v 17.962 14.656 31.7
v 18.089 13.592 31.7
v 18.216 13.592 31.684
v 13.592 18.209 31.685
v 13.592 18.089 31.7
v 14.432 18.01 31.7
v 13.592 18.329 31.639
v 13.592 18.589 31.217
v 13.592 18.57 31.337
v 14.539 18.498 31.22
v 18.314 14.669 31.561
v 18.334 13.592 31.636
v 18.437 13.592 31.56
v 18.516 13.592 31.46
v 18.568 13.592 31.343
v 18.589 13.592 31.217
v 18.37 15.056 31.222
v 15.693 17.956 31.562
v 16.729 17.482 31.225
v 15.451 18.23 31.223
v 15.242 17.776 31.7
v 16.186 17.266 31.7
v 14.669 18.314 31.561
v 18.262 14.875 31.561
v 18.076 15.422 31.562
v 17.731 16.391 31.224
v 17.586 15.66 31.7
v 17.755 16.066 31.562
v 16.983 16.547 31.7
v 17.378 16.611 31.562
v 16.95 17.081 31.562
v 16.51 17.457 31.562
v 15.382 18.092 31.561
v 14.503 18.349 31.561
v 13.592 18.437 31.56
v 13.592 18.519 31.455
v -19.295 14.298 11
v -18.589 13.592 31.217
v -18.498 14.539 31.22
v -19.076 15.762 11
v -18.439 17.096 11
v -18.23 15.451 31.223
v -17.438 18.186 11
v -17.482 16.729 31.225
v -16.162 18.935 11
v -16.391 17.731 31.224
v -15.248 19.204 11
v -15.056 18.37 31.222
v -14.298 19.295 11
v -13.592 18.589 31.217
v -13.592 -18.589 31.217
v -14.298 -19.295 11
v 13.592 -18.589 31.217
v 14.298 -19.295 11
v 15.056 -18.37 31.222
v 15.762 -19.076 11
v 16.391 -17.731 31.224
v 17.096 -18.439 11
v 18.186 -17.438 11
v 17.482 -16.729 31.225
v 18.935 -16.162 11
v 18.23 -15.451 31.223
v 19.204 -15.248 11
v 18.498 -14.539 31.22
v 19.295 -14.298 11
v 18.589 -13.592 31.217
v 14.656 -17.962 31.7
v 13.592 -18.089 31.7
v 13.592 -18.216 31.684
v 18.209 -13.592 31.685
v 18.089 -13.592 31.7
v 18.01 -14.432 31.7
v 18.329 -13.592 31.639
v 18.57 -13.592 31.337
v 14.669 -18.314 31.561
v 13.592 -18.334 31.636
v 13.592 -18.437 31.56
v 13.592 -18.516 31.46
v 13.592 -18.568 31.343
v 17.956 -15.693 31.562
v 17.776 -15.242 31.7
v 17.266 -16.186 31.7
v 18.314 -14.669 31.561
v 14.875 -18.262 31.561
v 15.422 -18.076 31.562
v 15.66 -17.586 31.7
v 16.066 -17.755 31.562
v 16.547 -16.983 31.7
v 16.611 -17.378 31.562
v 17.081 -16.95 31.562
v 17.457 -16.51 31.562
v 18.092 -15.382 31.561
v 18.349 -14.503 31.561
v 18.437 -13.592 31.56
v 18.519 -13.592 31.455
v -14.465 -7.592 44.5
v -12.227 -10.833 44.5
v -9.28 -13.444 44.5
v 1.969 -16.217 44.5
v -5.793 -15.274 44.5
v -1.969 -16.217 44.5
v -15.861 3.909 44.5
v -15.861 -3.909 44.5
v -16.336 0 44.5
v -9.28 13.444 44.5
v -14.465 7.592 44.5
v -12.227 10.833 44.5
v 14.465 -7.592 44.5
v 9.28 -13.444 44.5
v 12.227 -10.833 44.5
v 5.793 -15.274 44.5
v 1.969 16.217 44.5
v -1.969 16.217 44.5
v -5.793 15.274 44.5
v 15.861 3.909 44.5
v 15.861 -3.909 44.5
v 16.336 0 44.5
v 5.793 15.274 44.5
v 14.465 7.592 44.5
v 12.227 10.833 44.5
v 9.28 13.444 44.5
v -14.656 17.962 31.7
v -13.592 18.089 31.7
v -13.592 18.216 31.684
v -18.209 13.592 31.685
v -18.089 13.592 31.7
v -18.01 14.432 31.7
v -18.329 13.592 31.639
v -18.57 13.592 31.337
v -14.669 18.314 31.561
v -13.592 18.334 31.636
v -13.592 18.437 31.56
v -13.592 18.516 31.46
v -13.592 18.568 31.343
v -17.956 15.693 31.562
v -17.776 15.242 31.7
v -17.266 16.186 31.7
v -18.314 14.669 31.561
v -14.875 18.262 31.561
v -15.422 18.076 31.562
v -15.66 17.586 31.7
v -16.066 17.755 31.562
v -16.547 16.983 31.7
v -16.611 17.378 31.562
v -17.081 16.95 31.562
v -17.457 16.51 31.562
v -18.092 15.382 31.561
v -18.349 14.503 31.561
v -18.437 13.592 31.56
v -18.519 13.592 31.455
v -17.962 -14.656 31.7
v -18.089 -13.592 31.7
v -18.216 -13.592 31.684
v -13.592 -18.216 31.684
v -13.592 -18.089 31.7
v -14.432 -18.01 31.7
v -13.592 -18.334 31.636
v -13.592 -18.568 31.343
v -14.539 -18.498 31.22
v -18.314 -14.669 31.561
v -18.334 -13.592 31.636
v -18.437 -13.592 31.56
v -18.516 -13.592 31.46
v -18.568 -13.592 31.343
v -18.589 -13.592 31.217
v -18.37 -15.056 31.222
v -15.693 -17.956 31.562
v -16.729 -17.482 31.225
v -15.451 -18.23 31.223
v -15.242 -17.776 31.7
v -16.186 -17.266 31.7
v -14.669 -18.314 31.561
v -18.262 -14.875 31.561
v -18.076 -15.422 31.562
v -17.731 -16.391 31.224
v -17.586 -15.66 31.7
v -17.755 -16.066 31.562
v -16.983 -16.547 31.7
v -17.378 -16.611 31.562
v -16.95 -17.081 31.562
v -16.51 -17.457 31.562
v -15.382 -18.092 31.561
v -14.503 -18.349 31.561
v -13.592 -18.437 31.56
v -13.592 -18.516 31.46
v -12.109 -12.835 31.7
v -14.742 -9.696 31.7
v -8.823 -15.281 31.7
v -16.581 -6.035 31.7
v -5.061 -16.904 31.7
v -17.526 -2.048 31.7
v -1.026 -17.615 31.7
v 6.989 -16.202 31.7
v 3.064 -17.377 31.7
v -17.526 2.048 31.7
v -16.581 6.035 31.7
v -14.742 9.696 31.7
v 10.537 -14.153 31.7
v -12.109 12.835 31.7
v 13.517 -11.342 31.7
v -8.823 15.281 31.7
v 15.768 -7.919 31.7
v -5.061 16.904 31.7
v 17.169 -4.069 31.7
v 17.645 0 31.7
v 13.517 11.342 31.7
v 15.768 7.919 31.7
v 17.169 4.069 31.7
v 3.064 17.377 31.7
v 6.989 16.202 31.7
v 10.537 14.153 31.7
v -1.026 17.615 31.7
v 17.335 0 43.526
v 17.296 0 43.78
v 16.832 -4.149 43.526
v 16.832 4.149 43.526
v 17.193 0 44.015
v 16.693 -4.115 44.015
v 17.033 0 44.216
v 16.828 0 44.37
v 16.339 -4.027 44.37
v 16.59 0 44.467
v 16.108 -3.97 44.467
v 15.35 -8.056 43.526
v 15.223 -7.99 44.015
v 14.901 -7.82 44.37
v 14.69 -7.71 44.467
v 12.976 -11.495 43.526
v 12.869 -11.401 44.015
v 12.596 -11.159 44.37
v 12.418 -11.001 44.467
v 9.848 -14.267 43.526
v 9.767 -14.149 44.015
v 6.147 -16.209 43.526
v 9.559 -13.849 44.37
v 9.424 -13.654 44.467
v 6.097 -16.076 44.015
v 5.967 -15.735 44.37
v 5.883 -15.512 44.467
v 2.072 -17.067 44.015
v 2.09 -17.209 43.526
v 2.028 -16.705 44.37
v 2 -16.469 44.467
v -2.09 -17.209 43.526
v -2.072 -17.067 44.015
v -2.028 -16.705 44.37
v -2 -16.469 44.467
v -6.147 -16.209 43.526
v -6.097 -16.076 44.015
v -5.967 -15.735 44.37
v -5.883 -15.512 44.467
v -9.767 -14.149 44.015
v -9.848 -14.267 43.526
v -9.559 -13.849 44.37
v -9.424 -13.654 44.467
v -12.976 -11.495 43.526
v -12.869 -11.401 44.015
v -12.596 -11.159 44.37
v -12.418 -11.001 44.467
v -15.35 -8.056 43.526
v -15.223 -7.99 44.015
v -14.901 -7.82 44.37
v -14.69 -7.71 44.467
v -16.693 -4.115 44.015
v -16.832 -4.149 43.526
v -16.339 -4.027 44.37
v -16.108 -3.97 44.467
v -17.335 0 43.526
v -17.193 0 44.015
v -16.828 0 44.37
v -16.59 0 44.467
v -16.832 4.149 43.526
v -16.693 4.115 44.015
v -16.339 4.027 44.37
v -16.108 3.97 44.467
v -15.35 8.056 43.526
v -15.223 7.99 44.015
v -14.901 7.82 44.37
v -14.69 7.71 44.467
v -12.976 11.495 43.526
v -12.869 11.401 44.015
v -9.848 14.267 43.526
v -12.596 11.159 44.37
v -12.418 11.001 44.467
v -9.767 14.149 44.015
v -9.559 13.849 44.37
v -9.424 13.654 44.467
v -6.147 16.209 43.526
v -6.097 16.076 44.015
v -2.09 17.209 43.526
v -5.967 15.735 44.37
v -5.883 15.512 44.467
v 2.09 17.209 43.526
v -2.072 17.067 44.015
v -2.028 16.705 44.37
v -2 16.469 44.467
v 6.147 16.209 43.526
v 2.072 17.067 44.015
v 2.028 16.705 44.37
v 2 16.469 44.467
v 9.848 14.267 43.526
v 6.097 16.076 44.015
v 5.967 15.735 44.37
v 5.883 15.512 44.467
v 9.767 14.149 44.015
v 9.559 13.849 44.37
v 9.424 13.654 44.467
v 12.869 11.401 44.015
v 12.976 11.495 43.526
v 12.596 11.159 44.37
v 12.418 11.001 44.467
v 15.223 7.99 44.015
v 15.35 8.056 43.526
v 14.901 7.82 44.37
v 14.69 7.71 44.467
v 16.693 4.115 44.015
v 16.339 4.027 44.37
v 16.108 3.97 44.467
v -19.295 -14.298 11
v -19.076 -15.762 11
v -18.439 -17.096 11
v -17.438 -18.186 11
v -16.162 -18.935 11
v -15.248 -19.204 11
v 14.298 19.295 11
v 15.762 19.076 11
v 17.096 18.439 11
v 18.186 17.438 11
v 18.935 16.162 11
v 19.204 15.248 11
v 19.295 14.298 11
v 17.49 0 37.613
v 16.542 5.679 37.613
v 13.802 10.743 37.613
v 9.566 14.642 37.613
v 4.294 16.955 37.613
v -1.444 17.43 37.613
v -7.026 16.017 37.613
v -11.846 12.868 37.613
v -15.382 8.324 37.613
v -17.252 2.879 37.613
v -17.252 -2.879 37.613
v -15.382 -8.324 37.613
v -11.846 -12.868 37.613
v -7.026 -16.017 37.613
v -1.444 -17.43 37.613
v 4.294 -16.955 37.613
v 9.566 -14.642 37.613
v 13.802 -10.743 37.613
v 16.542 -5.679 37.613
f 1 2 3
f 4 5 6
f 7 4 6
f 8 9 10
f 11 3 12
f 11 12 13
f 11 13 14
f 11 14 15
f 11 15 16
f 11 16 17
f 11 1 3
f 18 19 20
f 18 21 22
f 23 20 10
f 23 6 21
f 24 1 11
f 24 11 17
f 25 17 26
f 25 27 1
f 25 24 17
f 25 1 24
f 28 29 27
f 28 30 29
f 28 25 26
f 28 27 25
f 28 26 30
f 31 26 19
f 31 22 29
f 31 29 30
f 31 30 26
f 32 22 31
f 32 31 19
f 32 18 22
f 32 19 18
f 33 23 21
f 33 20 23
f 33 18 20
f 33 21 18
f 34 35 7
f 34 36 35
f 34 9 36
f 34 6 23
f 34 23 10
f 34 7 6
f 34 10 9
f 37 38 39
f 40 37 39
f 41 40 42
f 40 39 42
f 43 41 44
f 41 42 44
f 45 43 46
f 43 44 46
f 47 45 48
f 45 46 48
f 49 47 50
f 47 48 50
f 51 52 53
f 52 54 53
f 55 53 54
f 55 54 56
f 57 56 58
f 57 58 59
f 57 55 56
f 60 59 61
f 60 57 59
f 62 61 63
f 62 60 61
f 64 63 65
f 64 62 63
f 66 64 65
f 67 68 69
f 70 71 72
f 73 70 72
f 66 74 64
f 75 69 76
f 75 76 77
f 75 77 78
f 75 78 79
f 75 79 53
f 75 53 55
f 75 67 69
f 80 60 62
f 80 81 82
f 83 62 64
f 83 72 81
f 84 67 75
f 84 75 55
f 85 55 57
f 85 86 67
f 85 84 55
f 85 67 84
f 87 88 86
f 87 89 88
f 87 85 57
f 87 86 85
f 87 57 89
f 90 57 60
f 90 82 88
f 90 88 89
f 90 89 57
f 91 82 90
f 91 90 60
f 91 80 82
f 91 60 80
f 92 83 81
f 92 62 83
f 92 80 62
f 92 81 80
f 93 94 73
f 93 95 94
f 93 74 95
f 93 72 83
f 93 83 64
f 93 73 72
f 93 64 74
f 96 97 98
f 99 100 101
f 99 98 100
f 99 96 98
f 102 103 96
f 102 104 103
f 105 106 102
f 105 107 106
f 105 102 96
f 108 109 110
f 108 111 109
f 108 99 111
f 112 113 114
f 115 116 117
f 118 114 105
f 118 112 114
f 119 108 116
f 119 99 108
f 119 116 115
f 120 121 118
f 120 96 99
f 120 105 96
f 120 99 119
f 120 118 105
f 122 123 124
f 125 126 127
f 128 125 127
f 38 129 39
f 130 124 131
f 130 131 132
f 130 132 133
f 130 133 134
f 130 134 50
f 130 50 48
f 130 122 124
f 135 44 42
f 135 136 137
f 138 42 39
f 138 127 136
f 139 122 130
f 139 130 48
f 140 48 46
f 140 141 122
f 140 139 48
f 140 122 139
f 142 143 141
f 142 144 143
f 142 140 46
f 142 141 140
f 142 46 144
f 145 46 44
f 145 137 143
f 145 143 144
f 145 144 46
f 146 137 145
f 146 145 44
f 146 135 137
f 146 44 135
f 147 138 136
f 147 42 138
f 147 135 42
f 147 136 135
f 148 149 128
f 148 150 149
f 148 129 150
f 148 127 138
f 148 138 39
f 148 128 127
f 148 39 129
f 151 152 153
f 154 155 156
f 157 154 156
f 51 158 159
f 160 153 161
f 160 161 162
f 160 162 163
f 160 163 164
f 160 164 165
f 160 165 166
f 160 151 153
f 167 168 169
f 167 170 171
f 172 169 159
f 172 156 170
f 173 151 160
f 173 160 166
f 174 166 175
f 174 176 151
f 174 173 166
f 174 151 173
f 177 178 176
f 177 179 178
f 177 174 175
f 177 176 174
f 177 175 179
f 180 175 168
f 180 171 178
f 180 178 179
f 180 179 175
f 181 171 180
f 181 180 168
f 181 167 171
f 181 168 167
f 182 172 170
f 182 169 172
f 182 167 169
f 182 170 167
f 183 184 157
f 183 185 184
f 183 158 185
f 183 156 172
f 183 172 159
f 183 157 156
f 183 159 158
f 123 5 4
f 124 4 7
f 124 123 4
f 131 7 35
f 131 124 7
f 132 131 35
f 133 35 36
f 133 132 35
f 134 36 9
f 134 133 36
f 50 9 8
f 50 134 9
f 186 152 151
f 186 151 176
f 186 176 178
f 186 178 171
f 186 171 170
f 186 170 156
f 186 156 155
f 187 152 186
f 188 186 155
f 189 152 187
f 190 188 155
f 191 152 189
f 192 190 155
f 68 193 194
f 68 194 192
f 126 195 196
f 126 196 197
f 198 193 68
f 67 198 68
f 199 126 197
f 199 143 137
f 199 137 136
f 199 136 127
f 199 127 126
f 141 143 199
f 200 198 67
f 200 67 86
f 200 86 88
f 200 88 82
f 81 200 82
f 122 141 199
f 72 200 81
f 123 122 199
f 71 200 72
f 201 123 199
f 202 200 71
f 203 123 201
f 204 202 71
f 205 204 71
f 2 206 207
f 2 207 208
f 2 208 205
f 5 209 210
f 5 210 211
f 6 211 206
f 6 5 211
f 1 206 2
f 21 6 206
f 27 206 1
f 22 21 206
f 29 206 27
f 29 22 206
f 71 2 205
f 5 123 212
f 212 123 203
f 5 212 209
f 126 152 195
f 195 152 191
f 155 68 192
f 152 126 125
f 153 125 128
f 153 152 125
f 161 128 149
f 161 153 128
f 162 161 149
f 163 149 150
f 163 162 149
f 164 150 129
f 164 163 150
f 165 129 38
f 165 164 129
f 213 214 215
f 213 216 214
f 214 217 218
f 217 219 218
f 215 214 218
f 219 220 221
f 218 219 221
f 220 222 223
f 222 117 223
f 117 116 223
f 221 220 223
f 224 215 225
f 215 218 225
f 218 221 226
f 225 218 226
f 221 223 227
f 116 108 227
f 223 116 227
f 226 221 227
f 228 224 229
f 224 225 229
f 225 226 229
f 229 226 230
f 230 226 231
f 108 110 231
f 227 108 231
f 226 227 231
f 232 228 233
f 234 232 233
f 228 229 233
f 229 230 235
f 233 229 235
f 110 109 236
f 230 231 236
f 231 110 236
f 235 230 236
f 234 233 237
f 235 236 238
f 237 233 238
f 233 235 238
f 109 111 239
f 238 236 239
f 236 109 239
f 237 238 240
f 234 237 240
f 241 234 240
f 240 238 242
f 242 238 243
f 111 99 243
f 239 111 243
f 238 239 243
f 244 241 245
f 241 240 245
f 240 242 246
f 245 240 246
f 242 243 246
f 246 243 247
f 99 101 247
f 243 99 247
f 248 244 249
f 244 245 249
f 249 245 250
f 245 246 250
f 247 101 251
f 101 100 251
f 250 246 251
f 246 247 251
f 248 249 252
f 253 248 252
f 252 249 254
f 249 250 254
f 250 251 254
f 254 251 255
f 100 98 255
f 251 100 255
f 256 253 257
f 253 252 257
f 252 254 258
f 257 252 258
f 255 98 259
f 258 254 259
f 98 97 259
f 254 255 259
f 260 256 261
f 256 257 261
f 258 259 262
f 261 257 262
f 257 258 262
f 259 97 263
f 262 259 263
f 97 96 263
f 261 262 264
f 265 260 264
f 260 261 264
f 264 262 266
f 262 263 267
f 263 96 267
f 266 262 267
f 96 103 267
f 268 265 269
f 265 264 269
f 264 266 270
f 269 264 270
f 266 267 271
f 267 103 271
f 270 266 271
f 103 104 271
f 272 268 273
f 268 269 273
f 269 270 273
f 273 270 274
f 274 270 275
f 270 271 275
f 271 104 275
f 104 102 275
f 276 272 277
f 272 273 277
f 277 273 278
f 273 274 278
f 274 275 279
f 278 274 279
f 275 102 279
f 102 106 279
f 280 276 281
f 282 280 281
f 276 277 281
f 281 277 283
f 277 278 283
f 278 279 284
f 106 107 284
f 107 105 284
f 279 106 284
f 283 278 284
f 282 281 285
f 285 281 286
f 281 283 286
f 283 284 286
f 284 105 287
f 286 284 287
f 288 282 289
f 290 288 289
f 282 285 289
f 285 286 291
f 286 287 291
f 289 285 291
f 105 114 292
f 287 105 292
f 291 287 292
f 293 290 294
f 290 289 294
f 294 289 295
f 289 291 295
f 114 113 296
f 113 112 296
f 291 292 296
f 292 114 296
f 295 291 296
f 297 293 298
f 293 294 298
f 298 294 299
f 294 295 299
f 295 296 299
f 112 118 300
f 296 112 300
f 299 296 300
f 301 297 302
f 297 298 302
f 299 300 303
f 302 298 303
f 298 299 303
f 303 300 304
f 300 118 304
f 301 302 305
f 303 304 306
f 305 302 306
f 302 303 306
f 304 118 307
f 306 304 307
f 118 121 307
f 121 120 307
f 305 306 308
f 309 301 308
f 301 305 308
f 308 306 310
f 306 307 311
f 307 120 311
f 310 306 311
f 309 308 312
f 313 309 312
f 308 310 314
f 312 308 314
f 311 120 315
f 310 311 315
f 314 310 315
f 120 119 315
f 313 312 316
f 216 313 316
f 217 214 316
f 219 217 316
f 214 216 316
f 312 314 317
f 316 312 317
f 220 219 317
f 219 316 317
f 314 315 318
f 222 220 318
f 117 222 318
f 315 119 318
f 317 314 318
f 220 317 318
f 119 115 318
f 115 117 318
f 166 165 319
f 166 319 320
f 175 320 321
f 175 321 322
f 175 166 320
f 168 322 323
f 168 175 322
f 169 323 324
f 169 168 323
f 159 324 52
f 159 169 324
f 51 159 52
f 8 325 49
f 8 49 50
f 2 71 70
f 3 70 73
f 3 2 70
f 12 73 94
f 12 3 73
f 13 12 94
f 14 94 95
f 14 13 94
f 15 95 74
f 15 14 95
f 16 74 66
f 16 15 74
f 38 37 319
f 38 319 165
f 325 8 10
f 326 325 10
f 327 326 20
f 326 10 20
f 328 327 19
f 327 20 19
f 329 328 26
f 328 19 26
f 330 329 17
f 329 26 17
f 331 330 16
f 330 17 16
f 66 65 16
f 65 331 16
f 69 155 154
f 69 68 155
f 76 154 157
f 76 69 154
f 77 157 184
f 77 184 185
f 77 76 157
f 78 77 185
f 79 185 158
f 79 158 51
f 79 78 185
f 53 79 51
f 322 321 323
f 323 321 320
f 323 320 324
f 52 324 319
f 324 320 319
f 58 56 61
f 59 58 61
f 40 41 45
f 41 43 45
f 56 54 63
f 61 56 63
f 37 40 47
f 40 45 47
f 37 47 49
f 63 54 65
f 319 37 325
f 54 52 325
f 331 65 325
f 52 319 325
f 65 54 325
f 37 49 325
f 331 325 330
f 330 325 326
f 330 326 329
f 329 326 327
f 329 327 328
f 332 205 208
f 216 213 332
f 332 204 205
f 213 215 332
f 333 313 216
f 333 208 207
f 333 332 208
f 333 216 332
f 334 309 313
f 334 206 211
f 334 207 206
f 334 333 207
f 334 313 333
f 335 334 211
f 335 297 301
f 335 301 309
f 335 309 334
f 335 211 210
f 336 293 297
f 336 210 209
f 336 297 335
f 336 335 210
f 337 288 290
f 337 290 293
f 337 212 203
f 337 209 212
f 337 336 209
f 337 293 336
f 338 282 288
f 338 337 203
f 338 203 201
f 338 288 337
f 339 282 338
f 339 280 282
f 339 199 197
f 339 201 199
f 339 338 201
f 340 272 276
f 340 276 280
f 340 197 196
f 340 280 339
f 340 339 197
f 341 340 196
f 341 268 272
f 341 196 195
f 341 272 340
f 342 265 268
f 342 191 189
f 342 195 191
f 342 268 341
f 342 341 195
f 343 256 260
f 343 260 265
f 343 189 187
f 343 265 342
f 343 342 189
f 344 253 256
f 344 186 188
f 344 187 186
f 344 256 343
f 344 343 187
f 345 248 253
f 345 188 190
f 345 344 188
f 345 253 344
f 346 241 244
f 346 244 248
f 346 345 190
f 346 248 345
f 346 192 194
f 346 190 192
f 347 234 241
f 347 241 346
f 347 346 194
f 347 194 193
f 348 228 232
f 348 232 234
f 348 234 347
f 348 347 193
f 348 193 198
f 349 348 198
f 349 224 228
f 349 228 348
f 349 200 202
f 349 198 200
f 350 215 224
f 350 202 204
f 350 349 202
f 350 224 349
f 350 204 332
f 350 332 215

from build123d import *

# Parameters (mm, degrees)
SKETCH058_W  = 38.59
SKETCH058_H  = 38.59
PAD041_DEPTH = 20.7
PAD041_TAPER = 2
SKETCH059_R  = 17.645
PAD042_DEPTH = 12.8
PAD042_TAPER = 1.5
FILLET_R     = 1
FILLET003_R  = 5
FILLET004_R  = 0.5


with BuildPart() as part:
    # Sketch058 → Pad041 (new body)
    with BuildSketch(Plane.XY):
        Rectangle(SKETCH058_W, SKETCH058_H)
    extrude(amount=PAD041_DEPTH, taper=PAD041_TAPER)

    # Sketch059 (on Face6 of Pad041) → Pad042 (join)
    with BuildSketch(Plane.XY.offset(20.7)):
        Circle(SKETCH059_R)
    extrude(amount=PAD042_DEPTH, taper=PAD042_TAPER)

    # Fillet
    fillet_edges = [part.edges().sort_by_distance(p)[0] for p in [
        (-17.30982, 0, 33.5),
    ]]
    fillet(fillet_edges, radius=FILLET_R)

    # Fillet003
    fillet003_edges = [part.edges().sort_by_distance(p)[0] for p in [
        (18.93357, -18.93357, 10.35),
        (18.93357, 18.93357, 10.35),
        (-18.93357, 18.93357, 10.35),
        (-18.93357, -18.93357, 10.35),
    ]]
    fillet(fillet003_edges, radius=FILLET003_R)

    # Fillet004
    fillet004_edges = [part.edges().sort_by_distance(p)[0] for p in [
        (0, -18.57214, 20.7),
        (-17.108935, -17.108935, 20.7),
        (-18.57214, 0, 20.7),
        (18.57214, 0, 20.7),
        (17.108935, 17.108935, 20.7),
        (0, 18.57214, 20.7),
        (17.108935, -17.108935, 20.7),
        (-17.108935, 17.108935, 20.7),
    ]]
    fillet(fillet004_edges, radius=FILLET004_R)


with BuildPart() as part_1:
    # Body023 placement: moved
    add(part.part.moved(Location((0, 0, 11))))


solid = part_1.part
